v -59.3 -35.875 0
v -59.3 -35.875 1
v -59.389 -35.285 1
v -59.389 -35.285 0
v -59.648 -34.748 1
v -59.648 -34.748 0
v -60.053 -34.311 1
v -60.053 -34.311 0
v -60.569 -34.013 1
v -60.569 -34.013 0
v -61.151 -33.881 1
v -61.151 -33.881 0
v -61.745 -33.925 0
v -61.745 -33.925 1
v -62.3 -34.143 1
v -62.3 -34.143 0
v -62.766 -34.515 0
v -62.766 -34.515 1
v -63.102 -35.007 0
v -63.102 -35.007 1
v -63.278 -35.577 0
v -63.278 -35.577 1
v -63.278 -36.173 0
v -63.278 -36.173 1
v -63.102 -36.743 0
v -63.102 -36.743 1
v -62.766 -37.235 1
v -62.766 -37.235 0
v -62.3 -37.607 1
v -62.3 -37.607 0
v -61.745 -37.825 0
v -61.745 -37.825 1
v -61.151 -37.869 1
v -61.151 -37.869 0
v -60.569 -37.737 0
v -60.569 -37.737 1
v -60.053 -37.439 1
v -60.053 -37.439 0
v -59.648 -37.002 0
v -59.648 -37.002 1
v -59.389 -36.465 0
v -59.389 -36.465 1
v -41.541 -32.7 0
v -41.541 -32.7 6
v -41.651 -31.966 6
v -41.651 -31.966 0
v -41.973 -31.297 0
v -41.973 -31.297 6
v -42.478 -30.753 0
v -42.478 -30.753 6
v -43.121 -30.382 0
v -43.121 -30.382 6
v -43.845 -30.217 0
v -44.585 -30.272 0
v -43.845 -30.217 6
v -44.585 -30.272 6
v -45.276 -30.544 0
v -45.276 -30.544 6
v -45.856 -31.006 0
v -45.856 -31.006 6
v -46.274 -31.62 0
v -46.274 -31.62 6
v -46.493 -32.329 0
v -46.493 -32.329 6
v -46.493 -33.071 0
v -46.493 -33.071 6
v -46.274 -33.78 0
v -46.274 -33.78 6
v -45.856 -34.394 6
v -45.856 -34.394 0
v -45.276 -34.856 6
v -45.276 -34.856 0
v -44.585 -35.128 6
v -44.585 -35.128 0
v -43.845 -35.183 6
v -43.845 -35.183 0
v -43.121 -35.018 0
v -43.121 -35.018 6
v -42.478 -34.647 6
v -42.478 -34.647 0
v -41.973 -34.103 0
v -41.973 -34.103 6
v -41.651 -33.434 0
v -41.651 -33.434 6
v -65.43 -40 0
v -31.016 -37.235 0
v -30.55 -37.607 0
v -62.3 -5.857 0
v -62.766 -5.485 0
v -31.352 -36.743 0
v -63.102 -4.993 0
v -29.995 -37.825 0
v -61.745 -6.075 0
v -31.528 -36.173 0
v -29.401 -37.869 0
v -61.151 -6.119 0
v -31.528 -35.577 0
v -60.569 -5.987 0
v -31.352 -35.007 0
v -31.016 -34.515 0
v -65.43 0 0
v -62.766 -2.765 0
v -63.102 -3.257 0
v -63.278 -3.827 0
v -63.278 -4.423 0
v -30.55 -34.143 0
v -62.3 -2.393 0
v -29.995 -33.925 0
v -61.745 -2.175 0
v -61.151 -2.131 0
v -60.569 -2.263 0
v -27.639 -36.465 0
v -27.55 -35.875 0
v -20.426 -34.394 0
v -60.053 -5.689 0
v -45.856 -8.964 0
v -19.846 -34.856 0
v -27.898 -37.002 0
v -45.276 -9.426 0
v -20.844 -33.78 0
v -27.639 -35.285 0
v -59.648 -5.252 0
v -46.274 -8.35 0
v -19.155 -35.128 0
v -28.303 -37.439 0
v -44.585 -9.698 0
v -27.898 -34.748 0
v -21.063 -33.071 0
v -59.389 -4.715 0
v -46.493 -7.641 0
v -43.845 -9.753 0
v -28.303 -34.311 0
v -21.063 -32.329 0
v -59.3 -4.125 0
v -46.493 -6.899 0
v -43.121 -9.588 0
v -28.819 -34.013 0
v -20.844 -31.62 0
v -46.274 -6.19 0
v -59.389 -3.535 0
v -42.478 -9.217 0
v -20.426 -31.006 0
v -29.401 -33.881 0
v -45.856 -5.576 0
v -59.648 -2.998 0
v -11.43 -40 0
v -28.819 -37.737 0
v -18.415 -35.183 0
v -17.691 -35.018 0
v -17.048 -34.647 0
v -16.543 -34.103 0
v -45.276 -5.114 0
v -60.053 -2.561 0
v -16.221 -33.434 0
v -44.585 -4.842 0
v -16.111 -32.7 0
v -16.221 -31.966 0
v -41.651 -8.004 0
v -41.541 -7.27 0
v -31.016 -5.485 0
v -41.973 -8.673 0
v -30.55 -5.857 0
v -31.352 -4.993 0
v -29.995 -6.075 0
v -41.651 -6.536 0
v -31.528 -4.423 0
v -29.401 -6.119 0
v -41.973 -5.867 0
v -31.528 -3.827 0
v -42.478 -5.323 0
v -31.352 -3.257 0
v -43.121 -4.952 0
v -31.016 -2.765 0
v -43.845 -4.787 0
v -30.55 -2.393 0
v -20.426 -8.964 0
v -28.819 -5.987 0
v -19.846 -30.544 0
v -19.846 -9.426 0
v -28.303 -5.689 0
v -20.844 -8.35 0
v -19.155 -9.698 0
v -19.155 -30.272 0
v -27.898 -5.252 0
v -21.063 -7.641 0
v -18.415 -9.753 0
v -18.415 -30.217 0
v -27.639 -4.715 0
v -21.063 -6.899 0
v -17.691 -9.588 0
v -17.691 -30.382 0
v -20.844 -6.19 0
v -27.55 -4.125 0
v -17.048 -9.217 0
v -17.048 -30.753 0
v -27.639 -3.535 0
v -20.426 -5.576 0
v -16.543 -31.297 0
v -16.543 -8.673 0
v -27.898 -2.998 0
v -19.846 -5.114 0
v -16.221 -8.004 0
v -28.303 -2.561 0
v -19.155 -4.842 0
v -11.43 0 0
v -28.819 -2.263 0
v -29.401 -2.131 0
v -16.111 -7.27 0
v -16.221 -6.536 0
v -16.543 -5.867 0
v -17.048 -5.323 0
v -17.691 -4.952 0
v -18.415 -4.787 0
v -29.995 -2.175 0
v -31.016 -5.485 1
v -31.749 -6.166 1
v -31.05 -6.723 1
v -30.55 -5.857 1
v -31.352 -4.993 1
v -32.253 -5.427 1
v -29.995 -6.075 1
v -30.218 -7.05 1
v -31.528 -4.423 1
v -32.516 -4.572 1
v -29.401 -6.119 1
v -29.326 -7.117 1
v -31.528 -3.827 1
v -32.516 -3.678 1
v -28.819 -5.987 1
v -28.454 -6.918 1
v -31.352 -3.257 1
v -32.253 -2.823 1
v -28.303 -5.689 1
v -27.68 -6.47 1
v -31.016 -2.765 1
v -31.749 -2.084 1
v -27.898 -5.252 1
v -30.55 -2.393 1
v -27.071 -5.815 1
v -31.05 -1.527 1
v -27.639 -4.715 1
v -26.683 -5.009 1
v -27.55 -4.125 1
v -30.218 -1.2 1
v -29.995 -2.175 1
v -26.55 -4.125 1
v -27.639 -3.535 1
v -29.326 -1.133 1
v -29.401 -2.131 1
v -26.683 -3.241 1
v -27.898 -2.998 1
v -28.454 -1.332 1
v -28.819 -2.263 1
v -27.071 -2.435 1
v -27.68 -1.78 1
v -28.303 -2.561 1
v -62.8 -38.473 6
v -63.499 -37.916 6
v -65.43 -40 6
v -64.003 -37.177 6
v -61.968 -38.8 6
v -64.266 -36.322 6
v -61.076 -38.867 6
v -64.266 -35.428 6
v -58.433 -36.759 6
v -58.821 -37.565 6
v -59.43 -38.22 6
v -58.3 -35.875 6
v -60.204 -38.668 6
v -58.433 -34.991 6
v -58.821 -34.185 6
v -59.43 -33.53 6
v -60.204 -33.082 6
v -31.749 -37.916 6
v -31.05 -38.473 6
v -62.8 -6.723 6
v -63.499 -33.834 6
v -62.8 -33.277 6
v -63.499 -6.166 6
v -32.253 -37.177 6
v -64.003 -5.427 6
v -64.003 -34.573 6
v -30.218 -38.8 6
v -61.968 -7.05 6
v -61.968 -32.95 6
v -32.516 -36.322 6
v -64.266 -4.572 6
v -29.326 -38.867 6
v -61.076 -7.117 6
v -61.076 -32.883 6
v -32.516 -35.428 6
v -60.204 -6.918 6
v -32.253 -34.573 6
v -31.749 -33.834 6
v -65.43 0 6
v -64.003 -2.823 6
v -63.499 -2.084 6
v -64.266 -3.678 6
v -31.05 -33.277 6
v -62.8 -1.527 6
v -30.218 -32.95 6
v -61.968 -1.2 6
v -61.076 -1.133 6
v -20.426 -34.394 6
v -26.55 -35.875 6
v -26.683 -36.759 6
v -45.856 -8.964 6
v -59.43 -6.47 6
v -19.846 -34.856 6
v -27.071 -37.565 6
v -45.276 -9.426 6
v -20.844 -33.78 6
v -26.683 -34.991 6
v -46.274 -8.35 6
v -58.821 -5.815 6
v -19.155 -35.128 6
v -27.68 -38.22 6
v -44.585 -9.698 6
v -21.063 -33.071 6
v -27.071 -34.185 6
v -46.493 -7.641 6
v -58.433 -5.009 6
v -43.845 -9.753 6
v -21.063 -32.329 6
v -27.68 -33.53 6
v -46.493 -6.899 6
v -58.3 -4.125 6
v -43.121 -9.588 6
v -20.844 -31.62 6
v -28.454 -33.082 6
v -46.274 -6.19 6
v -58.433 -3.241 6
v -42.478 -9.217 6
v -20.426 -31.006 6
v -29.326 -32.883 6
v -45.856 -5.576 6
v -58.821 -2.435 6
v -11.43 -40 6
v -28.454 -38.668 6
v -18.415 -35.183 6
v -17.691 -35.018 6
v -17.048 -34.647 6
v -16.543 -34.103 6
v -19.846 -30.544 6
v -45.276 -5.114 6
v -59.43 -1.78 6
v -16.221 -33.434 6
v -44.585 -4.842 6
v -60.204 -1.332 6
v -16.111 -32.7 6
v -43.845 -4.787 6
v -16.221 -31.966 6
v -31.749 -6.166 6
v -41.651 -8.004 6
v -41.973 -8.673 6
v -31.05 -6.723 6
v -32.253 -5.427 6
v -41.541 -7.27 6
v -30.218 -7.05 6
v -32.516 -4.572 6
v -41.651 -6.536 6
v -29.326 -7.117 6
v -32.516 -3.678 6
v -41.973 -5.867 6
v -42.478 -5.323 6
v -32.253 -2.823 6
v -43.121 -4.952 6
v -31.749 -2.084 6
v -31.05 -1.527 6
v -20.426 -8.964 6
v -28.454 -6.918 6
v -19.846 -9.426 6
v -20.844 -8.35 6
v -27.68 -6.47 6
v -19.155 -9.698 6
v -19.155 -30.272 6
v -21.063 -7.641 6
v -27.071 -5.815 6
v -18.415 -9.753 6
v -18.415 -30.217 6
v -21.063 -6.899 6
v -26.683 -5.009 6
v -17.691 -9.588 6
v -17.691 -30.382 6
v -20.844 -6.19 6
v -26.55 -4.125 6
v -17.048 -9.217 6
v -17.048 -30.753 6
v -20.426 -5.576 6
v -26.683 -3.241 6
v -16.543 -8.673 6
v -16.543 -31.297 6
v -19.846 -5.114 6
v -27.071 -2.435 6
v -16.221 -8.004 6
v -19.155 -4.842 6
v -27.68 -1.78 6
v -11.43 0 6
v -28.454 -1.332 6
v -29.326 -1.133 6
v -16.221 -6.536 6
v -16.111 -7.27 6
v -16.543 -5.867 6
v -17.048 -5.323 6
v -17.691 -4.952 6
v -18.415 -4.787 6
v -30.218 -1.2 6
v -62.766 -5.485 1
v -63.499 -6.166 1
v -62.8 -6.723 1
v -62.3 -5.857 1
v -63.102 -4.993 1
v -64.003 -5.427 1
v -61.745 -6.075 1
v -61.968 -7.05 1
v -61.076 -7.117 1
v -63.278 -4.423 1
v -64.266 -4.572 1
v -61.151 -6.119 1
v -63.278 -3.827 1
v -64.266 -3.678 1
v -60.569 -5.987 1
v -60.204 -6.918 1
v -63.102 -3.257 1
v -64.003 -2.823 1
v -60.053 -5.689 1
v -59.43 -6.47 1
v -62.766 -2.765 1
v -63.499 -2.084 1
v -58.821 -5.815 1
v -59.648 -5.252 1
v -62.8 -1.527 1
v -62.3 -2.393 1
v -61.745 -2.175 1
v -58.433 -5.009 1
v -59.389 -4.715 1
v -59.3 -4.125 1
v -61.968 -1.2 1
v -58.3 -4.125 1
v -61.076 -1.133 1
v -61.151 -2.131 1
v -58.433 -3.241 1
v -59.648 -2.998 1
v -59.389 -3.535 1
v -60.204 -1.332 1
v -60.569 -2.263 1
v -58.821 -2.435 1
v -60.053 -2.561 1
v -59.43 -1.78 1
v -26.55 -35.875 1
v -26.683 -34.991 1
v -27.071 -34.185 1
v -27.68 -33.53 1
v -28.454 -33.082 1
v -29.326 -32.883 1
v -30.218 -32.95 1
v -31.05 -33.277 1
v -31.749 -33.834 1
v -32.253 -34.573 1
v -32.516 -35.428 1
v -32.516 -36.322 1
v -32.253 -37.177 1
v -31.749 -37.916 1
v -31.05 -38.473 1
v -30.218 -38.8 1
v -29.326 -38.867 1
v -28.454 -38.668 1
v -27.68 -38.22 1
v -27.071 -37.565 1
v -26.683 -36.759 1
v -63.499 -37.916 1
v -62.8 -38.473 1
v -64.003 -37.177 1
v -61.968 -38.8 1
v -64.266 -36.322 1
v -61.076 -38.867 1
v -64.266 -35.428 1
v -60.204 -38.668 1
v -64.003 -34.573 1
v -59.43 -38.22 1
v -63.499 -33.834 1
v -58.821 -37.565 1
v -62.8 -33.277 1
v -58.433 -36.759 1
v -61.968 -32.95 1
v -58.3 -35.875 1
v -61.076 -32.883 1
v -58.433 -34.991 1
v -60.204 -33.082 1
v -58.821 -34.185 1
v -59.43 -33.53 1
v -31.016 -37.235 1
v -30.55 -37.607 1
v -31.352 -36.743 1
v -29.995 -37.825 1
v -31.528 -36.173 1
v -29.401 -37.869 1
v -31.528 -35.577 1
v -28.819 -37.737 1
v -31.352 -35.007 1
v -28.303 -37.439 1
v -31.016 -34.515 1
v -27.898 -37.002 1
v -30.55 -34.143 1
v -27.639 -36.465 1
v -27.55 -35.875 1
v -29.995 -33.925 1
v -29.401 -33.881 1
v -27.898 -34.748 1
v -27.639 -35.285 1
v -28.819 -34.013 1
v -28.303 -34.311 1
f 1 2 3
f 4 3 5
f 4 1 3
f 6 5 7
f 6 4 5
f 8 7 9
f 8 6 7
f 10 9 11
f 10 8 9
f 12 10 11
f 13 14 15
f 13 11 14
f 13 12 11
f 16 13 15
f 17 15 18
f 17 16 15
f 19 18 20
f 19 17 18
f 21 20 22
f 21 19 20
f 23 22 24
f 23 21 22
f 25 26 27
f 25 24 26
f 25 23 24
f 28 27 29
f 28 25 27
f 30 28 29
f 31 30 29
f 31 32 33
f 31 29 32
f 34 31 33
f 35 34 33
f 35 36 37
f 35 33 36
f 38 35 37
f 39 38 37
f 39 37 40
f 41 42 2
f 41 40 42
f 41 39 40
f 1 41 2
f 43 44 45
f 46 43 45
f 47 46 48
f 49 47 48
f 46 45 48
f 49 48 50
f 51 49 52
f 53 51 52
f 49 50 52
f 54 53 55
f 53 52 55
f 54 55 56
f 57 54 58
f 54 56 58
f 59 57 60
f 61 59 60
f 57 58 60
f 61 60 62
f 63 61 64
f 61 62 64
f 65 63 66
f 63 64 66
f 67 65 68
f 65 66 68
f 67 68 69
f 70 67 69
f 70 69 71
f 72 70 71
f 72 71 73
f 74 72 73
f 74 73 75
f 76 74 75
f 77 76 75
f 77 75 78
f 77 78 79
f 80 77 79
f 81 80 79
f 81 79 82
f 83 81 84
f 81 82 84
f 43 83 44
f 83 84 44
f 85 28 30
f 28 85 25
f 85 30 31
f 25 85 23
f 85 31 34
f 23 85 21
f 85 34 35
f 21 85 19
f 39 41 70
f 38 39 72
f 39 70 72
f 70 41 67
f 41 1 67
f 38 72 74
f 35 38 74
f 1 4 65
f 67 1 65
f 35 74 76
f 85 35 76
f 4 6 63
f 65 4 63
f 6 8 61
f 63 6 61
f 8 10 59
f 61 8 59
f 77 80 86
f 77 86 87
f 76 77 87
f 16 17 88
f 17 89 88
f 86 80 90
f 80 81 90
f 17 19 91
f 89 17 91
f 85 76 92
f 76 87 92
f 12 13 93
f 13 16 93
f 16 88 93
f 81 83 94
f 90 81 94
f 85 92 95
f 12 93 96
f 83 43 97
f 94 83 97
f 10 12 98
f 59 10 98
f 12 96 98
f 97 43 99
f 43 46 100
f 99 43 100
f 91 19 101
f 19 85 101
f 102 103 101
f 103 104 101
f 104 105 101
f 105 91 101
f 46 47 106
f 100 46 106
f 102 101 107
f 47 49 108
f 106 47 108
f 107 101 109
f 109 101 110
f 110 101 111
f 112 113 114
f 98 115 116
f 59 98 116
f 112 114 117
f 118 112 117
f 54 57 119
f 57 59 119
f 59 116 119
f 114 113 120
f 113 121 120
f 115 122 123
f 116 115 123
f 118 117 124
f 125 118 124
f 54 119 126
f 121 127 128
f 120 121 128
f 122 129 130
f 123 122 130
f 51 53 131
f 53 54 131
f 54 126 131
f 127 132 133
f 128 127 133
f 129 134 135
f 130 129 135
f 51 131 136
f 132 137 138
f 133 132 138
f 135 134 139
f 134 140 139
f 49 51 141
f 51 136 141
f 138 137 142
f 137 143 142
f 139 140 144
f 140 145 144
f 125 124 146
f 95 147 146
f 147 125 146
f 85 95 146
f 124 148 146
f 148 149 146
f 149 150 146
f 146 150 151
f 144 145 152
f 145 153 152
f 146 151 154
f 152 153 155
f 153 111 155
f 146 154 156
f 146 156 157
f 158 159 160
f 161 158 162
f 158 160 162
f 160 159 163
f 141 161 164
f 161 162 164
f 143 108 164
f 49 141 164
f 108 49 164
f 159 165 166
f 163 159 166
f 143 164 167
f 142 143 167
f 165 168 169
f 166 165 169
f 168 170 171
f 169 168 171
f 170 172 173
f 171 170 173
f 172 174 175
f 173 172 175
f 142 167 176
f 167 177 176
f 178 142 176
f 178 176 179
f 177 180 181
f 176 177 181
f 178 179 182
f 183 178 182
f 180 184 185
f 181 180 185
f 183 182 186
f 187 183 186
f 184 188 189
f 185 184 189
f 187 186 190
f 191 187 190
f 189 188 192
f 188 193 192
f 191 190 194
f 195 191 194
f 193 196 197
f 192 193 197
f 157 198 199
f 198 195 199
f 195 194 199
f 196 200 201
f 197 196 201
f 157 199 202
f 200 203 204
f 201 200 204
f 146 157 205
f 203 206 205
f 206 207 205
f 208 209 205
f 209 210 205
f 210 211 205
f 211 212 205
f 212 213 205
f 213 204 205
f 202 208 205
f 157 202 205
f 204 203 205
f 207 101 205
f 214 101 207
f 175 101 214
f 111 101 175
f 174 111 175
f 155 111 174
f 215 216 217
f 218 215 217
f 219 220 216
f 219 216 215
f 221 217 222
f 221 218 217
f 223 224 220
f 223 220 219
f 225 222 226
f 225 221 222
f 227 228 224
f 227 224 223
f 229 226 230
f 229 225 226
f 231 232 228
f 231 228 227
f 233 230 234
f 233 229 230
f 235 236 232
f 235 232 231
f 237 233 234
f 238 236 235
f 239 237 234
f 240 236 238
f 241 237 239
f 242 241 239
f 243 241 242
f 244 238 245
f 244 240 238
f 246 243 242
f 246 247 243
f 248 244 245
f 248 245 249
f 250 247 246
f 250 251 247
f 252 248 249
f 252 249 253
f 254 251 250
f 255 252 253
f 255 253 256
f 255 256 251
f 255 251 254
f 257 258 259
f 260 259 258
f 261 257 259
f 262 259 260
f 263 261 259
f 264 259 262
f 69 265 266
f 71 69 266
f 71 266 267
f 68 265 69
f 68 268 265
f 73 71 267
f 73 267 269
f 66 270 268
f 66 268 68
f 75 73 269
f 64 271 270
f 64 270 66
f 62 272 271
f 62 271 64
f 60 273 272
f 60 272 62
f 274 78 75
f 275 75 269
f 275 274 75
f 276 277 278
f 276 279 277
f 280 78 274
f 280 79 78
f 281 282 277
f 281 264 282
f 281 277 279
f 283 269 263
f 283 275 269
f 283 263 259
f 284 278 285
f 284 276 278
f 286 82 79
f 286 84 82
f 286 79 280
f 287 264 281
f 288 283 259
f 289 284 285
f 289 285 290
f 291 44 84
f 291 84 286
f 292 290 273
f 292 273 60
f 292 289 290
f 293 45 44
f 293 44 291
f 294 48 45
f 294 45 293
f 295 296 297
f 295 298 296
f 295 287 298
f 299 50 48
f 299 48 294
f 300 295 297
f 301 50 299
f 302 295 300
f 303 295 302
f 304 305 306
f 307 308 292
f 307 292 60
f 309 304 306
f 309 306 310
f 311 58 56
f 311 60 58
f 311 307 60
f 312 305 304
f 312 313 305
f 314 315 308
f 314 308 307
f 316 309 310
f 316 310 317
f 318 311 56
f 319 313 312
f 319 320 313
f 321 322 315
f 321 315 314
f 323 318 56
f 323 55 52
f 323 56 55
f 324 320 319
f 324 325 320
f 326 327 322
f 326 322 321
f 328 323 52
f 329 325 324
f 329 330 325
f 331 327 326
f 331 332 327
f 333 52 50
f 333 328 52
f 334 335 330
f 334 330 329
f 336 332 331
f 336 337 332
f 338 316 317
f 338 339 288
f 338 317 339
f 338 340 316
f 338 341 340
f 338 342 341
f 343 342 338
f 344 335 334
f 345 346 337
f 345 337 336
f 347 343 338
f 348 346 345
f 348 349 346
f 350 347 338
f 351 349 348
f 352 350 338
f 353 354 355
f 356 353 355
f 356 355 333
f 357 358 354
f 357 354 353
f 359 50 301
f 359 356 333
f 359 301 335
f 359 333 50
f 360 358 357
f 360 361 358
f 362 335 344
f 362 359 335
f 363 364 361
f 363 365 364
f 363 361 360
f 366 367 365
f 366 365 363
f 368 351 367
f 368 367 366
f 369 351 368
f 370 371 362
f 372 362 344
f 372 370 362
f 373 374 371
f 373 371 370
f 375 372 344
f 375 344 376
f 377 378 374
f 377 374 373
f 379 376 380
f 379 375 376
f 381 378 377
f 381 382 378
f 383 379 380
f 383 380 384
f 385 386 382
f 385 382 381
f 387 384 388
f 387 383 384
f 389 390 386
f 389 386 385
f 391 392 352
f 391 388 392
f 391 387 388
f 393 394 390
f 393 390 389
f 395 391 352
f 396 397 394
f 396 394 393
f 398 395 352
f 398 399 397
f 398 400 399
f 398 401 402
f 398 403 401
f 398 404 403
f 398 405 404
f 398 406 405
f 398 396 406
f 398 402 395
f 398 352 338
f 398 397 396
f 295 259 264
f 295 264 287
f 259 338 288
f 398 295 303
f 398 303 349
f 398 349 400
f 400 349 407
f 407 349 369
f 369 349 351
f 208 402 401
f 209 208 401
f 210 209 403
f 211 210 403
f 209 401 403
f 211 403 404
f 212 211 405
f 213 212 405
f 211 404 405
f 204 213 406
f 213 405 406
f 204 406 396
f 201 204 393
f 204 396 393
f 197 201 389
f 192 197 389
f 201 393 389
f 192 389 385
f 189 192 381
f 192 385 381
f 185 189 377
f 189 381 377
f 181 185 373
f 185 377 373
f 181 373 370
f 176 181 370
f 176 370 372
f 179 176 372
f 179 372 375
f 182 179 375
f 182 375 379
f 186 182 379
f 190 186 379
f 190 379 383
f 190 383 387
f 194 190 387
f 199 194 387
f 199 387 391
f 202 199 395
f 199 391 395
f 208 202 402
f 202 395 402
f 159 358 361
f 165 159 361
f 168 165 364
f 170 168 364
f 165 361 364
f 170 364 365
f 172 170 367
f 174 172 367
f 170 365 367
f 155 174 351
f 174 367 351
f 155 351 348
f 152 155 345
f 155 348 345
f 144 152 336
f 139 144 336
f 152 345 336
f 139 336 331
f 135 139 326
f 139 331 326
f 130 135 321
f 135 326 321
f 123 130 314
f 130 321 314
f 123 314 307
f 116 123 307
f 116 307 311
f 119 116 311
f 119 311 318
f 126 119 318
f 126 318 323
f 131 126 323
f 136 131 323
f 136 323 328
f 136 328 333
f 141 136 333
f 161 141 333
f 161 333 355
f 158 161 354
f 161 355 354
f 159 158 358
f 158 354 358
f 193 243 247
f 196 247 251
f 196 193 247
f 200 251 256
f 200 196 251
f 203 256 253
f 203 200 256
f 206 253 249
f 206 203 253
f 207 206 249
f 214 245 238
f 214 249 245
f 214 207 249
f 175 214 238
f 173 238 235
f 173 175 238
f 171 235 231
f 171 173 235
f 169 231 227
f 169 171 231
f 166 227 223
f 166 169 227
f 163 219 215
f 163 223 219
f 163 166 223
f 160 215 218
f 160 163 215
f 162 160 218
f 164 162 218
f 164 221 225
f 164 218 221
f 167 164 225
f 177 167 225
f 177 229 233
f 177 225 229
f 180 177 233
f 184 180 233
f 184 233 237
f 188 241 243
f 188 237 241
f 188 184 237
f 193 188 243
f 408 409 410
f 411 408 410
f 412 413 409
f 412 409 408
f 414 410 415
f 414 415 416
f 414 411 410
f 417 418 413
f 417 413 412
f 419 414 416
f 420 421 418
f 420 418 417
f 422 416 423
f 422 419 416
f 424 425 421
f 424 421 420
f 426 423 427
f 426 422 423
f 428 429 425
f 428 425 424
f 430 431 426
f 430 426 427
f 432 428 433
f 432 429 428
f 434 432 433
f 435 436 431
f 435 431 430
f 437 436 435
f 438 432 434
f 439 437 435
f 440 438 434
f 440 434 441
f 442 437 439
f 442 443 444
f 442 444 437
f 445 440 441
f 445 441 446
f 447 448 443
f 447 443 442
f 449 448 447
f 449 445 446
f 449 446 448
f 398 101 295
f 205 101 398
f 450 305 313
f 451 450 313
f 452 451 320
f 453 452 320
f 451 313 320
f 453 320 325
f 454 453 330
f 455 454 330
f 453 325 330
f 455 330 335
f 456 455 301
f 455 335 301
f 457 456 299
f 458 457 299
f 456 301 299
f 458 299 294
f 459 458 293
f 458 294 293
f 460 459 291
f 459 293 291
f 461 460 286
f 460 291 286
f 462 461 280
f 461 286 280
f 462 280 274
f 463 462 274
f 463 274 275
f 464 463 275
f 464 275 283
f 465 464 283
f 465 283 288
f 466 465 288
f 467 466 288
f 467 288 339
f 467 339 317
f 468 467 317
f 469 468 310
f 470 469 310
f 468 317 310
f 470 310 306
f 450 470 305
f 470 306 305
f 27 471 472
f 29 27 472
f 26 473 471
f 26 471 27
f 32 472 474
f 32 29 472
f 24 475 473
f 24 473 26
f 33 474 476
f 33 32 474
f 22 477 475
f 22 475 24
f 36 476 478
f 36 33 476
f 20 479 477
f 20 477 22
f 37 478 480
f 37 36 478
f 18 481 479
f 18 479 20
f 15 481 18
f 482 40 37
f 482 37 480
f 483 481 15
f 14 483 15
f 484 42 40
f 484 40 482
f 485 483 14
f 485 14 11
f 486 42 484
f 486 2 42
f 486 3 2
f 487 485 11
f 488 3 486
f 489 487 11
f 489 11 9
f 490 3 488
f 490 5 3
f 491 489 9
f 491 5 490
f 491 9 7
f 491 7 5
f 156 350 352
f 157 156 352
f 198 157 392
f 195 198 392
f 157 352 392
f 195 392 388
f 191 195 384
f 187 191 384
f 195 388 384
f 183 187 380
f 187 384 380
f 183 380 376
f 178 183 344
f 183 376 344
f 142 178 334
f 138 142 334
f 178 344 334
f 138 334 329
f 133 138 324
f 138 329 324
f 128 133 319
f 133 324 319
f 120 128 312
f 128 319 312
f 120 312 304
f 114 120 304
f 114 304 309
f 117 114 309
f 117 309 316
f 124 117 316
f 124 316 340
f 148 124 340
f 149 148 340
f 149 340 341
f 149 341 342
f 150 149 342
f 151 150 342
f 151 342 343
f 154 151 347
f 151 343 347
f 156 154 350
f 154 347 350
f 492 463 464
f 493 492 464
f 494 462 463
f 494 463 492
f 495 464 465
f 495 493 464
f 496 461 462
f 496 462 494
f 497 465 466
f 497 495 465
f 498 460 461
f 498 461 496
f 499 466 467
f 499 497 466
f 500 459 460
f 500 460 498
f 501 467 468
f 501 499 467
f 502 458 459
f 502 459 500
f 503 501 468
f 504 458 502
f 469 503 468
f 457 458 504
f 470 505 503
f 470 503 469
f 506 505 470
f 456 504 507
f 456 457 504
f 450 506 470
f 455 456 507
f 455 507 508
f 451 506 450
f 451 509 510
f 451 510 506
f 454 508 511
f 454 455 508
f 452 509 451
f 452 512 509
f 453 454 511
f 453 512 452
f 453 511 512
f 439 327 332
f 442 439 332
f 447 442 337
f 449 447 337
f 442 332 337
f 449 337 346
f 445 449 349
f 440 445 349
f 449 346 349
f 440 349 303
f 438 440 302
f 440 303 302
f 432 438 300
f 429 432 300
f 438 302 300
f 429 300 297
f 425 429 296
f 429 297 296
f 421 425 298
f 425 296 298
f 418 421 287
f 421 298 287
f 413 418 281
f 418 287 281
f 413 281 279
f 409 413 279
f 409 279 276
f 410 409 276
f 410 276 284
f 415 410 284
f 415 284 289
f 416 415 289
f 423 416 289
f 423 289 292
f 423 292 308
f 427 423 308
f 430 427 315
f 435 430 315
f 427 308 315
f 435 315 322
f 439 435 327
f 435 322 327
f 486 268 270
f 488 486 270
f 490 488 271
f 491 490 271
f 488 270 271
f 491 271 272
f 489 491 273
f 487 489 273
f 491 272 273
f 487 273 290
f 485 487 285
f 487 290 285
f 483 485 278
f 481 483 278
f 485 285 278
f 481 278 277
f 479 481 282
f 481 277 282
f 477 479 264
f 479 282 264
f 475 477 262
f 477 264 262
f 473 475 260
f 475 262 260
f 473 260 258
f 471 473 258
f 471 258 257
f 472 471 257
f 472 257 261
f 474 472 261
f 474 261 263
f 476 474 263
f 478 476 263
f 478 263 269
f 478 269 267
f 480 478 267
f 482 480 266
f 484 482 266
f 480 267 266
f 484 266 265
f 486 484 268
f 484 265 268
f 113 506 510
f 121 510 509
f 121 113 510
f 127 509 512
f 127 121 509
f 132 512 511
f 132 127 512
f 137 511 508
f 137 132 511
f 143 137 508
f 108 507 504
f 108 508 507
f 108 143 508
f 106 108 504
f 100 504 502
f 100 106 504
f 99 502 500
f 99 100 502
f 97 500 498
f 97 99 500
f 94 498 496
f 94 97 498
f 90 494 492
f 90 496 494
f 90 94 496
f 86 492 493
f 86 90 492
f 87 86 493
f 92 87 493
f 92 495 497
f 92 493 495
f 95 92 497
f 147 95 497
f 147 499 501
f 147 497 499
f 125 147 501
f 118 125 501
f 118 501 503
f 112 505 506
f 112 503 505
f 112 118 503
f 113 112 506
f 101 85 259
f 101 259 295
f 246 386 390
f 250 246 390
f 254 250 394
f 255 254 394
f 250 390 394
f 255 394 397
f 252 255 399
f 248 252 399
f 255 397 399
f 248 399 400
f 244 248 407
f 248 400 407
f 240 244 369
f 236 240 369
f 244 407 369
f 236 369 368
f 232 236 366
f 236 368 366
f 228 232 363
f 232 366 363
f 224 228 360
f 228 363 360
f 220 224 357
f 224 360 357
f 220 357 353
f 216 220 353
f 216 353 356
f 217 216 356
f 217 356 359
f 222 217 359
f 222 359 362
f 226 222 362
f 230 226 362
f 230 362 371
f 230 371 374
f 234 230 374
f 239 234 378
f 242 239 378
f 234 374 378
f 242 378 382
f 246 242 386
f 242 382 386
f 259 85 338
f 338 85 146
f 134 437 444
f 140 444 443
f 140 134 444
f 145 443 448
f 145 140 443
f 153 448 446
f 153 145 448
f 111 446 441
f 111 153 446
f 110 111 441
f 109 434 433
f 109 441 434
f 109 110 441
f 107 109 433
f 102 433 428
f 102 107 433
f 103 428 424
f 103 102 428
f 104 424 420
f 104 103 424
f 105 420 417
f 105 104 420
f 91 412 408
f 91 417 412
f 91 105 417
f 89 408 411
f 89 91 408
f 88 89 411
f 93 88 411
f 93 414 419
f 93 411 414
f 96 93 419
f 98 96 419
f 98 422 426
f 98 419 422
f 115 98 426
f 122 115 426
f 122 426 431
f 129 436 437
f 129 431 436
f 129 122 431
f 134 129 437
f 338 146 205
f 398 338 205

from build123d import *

# Parameters (mm, degrees)
SKETCH1_W           = 54
SKETCH1_H           = 40
BOSS_EXTRUDE1_DEPTH = 6
SKETCH2_R           = 2
CUT_EXTRUDE2_DEPTH  = 7
SKETCH8_R           = 3
CUT_EXTRUDE6_DEPTH  = 5
SKETCH9_R           = 2.49
CUT_EXTRUDE7_DEPTH  = 6


with BuildPart() as part:
    # Sketch1 → Boss-Extrude1 (new body)
    with BuildSketch(Plane.XY):
        with Locations((-38.43, -20)):
            Rectangle(SKETCH1_W, SKETCH1_H)
    extrude(amount=BOSS_EXTRUDE1_DEPTH)

    # Sketch2 → Cut-Extrude2 (cut, through all)
    with BuildSketch(Plane.XY):
        with Locations((-61.3, -35.875)):
            Circle(SKETCH2_R)
        with Locations((-29.55, -35.875)):
            Circle(SKETCH2_R)
        with Locations((-29.55, -4.125)):
            Circle(SKETCH2_R)
        with Locations((-61.3, -4.125)):
            Circle(SKETCH2_R)
    extrude(amount=CUT_EXTRUDE2_DEPTH, mode=Mode.SUBTRACT)

    # Sketch8 → Cut-Extrude6 (cut)
    with BuildSketch(Plane.XY.offset(6)):
        with Locations((-61.3, -4.125)):
            Circle(SKETCH8_R)
        with Locations((-29.55, -4.125)):
            Circle(SKETCH8_R)
        with Locations((-29.55, -35.875)):
            Circle(SKETCH8_R)
        with Locations((-61.3, -35.875)):
            Circle(SKETCH8_R)
    extrude(amount=-CUT_EXTRUDE6_DEPTH, mode=Mode.SUBTRACT)

    # Sketch9 → Cut-Extrude7 (cut)
    with BuildSketch(Plane.XY.offset(6)):
        with Locations((-44.030806884, -7.27)):
            Circle(SKETCH9_R)
        with Locations((-18.600806884, -7.27)):
            Circle(SKETCH9_R)
        with Locations((-44.030806884, -32.7)):
            Circle(SKETCH9_R)
        with Locations((-18.600806884, -32.7)):
            Circle(SKETCH9_R)
    extrude(amount=-CUT_EXTRUDE7_DEPTH, mode=Mode.SUBTRACT)


solid = part.part
